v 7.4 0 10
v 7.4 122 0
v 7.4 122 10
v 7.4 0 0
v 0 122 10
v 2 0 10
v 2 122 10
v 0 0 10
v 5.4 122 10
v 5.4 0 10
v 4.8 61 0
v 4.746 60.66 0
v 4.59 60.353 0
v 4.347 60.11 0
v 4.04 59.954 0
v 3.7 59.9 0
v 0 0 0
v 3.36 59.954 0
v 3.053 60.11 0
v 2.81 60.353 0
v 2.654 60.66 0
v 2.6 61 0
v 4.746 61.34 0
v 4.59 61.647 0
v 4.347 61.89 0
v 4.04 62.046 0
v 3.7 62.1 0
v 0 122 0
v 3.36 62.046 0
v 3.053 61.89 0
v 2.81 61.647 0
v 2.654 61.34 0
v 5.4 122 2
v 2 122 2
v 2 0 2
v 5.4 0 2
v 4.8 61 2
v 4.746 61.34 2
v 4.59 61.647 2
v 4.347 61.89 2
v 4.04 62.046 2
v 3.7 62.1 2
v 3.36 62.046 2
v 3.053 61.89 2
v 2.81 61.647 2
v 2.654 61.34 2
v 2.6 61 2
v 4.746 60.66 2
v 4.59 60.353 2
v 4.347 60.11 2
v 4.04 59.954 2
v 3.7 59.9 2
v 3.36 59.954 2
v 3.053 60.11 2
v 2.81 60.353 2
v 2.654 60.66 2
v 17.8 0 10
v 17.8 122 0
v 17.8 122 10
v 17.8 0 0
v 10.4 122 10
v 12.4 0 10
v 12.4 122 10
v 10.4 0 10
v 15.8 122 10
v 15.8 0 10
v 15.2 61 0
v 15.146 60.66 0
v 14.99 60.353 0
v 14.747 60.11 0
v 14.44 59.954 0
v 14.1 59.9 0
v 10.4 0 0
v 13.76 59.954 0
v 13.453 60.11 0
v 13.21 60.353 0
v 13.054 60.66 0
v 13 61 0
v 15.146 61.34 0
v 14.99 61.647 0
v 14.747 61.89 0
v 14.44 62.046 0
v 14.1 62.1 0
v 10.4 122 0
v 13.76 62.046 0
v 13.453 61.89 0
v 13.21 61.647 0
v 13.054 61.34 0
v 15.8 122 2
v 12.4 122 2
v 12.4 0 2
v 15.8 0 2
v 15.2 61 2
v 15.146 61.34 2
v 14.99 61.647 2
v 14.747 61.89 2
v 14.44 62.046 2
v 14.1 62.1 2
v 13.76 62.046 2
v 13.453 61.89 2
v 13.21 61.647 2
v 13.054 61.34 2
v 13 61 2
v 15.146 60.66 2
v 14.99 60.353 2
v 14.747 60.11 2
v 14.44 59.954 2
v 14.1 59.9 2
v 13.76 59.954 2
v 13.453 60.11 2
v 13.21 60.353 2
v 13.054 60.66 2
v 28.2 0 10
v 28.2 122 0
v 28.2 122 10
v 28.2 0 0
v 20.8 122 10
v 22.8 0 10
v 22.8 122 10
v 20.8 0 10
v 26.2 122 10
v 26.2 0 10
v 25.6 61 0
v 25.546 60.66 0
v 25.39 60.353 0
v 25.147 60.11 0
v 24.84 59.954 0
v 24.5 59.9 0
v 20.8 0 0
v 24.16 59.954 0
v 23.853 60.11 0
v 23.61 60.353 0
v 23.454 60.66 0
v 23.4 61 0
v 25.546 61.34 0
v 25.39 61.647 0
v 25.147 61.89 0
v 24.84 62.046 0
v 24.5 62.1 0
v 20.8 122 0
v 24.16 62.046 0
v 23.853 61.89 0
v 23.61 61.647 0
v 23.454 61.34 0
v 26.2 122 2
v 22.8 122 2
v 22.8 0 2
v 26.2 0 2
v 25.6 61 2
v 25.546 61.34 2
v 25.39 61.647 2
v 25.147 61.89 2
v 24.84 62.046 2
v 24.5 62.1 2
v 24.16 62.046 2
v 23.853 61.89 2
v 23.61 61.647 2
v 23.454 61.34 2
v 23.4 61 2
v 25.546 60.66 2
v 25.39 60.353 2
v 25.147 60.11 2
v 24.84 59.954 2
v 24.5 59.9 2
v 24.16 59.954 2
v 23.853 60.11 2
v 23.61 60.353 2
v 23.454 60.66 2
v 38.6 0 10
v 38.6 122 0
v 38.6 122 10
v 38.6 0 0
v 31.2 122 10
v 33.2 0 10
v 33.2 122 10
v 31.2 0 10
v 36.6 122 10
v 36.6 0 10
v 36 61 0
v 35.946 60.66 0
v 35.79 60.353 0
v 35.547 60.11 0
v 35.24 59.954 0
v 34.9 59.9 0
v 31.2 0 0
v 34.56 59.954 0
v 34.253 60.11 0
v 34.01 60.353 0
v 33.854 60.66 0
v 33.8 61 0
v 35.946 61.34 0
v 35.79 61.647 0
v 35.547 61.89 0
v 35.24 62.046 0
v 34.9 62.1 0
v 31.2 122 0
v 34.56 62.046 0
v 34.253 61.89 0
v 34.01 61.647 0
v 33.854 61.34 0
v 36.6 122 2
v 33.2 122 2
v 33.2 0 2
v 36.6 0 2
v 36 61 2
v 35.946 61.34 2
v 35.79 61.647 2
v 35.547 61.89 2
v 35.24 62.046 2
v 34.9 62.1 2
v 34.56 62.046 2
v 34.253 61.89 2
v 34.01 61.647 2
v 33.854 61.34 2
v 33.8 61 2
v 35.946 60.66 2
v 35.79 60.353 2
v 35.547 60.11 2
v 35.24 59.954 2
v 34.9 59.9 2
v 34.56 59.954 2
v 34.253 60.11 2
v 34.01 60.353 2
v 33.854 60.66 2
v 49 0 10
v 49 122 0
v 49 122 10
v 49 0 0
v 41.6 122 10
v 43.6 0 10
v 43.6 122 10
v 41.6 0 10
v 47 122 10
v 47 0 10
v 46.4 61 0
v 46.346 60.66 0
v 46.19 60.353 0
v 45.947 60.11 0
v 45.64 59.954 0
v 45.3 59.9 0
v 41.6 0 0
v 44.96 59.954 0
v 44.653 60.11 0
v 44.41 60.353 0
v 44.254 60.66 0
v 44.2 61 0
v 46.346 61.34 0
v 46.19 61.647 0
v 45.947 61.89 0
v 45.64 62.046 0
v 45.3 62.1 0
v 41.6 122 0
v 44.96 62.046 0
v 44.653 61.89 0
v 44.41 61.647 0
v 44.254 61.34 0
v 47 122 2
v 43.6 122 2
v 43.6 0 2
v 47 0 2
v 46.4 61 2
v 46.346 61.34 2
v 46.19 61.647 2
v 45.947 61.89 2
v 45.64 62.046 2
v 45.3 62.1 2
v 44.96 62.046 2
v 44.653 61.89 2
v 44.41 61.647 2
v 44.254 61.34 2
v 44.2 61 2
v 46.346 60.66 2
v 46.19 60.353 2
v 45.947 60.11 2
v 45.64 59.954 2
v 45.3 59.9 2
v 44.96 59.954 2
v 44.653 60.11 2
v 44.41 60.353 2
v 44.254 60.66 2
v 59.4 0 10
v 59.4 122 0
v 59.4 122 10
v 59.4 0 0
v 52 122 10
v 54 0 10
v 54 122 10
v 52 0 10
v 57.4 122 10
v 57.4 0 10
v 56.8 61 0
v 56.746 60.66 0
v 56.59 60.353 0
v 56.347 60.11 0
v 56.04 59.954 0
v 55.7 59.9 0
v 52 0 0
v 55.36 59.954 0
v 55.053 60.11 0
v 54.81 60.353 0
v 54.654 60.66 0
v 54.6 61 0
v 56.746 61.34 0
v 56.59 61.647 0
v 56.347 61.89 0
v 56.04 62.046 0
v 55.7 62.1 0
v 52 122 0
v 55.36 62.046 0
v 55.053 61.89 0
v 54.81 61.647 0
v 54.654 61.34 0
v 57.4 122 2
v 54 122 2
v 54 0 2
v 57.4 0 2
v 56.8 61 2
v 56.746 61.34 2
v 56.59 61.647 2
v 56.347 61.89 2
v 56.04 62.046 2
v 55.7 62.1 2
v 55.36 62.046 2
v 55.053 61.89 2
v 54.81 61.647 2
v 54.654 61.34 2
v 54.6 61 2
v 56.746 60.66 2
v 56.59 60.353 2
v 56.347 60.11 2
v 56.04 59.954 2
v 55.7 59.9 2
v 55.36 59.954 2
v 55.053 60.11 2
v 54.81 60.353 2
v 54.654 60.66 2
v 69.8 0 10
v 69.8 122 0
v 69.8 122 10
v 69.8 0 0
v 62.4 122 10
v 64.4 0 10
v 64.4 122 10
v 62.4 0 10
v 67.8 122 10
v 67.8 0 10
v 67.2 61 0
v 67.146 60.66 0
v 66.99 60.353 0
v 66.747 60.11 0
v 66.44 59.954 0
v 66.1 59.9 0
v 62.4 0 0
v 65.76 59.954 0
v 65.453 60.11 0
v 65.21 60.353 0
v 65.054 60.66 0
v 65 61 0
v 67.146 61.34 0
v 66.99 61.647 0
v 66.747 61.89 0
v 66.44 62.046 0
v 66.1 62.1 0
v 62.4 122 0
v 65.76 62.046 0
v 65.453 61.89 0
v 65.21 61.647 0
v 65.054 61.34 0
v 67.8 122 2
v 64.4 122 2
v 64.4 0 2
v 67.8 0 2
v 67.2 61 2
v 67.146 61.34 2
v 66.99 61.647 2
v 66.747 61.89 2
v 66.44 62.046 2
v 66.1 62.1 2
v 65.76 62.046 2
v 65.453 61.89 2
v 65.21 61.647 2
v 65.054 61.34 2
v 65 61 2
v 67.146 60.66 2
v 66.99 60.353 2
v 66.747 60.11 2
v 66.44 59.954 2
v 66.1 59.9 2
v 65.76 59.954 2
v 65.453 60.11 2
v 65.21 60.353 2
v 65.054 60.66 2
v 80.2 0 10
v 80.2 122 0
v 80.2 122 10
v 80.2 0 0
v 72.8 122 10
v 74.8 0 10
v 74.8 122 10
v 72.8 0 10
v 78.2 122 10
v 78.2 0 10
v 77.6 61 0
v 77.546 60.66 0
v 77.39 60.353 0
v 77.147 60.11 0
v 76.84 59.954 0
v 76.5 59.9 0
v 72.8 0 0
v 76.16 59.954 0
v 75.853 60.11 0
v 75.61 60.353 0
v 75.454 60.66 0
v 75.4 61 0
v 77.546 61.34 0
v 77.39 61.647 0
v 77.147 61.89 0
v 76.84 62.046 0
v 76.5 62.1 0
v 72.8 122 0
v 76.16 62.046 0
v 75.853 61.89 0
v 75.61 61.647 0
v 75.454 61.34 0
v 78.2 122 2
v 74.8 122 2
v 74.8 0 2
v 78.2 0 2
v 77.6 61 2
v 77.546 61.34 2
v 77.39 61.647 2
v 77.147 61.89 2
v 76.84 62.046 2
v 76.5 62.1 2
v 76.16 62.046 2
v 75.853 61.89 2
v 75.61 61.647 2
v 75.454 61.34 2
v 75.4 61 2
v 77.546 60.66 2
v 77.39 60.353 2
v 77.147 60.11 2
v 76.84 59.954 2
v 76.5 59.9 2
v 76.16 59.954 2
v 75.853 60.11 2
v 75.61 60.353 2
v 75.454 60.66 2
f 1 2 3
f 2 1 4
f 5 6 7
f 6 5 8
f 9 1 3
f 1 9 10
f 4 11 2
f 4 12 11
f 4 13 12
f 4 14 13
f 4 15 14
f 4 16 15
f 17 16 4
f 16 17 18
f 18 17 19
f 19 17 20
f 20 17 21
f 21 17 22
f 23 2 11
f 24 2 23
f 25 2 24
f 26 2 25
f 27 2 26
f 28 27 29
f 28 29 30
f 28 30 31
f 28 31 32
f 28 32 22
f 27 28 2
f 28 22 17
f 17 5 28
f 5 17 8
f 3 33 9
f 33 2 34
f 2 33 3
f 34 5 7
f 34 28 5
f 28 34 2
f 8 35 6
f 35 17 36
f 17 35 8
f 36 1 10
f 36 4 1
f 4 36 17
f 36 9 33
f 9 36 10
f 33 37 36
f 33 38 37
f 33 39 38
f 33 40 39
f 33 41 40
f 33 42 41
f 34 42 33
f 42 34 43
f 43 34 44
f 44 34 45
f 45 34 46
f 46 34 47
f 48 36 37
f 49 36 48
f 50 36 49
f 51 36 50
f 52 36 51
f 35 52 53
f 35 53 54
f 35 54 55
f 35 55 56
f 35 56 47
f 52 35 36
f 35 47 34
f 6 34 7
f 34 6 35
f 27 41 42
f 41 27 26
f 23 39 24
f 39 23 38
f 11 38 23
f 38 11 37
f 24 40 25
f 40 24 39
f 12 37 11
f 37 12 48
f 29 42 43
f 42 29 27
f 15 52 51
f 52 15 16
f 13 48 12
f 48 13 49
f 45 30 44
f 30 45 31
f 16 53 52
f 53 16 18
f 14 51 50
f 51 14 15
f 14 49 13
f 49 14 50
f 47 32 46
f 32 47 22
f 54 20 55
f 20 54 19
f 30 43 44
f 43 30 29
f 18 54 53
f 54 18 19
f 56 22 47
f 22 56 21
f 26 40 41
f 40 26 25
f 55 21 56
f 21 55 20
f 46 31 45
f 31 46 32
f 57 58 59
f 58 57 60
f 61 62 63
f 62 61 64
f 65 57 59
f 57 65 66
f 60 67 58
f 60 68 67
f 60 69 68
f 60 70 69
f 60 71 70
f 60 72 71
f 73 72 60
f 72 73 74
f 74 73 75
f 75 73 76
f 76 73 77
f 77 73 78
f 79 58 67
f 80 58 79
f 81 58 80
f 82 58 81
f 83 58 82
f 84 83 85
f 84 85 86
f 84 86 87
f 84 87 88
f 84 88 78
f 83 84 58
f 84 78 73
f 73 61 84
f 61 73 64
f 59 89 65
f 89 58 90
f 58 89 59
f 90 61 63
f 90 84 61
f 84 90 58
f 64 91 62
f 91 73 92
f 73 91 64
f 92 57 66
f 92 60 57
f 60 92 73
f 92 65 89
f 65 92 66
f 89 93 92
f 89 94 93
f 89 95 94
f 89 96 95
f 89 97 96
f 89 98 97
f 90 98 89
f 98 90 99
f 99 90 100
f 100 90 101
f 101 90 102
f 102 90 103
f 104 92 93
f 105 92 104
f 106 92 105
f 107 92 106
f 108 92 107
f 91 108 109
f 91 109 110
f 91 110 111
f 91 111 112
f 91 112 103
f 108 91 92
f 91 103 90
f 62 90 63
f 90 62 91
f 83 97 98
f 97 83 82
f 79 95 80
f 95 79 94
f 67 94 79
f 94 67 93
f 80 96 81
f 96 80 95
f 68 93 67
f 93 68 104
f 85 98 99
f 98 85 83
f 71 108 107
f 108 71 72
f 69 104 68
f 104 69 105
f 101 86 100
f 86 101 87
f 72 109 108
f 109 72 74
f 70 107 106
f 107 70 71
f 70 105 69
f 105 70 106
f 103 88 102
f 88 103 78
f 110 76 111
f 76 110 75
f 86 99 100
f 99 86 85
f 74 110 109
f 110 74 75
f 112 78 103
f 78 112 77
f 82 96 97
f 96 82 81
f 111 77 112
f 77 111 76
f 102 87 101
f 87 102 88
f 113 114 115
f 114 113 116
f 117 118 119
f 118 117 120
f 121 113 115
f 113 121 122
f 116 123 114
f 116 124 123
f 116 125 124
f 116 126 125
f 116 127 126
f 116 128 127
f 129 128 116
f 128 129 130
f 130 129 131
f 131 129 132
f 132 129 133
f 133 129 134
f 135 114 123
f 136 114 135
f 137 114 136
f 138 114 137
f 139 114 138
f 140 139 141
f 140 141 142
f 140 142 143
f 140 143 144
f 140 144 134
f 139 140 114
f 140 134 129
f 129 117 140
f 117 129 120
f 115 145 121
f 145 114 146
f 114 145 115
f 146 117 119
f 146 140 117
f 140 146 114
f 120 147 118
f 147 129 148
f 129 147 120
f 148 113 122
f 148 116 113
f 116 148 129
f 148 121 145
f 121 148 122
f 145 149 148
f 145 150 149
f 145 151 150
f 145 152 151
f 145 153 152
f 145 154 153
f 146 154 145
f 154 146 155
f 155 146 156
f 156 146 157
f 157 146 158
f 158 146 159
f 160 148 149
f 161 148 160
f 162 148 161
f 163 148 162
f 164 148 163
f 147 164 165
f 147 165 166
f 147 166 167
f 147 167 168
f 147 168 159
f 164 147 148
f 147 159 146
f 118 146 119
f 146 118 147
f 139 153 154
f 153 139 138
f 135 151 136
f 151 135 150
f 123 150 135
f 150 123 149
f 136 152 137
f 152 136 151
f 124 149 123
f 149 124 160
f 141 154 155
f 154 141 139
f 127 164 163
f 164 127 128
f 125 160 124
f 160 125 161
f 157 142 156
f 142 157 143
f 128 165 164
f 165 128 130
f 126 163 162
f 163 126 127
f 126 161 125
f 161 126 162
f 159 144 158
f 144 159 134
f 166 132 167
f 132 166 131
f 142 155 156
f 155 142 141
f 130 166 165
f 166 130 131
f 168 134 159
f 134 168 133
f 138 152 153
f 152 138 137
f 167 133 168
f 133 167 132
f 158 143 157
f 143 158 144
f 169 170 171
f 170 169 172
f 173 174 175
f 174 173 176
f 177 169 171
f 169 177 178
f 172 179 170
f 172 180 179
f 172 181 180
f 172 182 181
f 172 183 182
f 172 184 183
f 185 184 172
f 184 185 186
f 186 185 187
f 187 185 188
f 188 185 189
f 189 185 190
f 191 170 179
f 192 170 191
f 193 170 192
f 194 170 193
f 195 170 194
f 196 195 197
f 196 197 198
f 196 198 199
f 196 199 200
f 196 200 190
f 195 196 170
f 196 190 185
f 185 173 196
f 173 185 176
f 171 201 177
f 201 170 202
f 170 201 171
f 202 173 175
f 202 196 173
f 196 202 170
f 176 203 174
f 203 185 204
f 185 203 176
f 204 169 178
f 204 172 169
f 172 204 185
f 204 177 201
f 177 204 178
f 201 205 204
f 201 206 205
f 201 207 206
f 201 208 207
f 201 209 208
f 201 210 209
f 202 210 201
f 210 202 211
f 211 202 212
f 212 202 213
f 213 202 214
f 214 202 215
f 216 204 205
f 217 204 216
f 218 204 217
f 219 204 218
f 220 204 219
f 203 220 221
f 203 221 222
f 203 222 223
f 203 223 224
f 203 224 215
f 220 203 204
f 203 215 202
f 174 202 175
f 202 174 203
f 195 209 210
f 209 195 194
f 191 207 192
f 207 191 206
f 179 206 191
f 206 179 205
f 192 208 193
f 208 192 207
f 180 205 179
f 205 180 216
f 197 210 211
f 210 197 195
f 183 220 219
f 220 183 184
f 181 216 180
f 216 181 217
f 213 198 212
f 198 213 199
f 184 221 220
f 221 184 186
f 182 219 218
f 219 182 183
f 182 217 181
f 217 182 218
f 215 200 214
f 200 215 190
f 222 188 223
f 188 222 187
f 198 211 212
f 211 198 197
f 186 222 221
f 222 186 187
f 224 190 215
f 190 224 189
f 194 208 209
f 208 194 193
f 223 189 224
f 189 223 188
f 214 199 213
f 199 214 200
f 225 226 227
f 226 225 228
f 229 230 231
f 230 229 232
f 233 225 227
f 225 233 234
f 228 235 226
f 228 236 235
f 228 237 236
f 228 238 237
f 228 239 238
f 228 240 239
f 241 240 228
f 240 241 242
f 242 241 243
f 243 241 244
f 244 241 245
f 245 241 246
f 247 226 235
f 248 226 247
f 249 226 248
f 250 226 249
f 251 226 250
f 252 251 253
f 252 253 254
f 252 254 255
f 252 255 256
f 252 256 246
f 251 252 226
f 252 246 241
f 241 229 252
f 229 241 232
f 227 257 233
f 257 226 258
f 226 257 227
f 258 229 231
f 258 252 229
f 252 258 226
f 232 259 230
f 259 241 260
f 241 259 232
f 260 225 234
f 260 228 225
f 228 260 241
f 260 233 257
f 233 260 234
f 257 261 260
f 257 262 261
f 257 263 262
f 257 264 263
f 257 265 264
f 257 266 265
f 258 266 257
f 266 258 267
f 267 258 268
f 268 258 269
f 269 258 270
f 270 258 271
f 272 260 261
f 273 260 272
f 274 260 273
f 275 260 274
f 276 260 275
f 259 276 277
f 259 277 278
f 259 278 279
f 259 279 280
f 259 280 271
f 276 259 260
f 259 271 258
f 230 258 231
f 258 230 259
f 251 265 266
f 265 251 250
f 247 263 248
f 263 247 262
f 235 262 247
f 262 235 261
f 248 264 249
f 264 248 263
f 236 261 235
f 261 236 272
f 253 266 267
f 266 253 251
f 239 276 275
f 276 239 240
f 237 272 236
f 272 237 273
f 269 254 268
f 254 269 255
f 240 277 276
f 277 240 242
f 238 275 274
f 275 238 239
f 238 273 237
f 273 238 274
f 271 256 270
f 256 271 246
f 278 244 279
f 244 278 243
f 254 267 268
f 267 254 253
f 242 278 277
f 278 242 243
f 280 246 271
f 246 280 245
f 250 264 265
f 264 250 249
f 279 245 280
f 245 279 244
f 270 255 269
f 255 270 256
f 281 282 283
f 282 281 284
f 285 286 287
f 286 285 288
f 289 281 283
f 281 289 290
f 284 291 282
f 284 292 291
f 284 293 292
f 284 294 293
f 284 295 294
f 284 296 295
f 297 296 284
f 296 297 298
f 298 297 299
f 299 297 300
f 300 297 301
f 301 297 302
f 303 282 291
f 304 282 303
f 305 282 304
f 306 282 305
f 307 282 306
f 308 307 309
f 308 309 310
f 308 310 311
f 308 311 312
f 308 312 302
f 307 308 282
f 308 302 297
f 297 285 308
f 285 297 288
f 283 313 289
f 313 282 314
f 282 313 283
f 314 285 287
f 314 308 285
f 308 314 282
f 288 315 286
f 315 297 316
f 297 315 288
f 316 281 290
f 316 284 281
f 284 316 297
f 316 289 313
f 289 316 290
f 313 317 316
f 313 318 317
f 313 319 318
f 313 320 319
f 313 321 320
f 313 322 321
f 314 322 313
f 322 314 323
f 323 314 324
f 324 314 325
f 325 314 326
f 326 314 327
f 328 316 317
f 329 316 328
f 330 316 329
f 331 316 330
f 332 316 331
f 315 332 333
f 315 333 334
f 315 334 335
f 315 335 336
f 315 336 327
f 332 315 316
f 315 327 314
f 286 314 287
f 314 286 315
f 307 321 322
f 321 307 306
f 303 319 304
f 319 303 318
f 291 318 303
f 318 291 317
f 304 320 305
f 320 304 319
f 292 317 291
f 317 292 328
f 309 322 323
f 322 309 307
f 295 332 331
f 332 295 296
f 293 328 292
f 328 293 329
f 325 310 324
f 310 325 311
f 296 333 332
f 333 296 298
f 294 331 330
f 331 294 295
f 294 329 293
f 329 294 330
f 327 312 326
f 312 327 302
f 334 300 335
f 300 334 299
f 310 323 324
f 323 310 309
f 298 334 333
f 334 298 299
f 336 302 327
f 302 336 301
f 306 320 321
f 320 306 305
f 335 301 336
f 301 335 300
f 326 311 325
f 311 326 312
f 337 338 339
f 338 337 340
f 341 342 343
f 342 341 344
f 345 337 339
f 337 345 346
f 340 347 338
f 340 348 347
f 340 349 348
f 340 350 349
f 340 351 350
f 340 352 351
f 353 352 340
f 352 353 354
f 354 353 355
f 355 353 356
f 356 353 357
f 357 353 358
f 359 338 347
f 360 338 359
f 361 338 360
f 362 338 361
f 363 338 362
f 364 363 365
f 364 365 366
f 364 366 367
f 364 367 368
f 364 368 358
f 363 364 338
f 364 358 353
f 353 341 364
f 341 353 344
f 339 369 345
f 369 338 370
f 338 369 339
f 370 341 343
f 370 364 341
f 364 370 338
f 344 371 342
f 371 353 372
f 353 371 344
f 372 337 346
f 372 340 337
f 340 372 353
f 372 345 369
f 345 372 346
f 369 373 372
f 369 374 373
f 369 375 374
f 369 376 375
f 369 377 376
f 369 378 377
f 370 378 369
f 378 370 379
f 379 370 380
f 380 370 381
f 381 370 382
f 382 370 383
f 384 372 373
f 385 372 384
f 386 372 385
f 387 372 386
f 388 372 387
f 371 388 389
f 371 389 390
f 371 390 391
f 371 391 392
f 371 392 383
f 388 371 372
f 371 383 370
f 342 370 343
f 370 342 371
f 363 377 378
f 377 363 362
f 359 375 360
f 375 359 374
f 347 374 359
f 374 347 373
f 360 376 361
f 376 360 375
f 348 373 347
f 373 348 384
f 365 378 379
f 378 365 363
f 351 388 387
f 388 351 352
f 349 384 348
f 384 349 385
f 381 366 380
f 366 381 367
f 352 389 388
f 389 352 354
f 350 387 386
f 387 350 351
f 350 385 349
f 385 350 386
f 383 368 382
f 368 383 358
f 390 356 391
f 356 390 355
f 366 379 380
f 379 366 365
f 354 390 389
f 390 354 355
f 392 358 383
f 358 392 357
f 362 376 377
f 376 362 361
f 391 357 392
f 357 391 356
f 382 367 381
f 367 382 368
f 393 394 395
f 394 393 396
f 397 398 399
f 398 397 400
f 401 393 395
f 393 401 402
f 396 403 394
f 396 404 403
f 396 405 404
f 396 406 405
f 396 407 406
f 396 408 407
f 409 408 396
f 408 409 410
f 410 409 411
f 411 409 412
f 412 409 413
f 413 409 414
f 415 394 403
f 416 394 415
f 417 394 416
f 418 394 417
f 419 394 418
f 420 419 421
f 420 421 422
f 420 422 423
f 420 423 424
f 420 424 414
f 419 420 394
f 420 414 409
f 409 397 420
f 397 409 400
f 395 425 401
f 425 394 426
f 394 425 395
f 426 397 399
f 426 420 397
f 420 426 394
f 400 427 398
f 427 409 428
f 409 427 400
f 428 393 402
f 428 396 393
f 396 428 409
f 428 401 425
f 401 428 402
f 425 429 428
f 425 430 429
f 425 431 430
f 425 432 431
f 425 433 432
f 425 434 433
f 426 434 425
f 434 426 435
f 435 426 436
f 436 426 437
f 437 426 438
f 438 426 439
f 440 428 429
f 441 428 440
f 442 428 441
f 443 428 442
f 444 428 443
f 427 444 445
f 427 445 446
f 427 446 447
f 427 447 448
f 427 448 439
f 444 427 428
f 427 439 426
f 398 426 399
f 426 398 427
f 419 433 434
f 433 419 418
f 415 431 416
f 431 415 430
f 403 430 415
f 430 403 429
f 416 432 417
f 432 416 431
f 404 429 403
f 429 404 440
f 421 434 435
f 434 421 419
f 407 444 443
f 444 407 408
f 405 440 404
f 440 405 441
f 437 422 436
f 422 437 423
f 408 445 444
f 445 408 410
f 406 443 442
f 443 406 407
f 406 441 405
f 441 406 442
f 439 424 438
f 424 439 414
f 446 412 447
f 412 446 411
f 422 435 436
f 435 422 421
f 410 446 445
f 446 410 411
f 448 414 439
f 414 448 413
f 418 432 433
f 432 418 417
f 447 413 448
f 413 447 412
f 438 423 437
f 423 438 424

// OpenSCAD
// ============================================================
// PRINT: TRILHOS TELA CARVÃO (Posições 5 e 6)
// 8 peças idênticas — canal 3.4mm (MDF 3mm + 0.4mm folga)
// Mesa: 83mm × 122mm — cabe na Ender 3 (200×200mm) ✓
// Tempo estimado: ~50min
// ============================================================
// 2 filtros × 2 laterais × 2 metades = 8 peças
// Todas idênticas (junta reta, sem dovetail)
// ============================================================

use <TRILHO_FILTRO.scad>

gap = 3;
canal = 3.4;
largura = canal + 2*2; // 7.4mm

// 8 peças lado a lado em X
for (i = [0:7]) {
    translate([i * (largura + gap), 0, 0])
        trilho_metade_a(canal);
}

// Guia visual da mesa (não imprime)
%translate([0, 0, -0.5])
    cube([200, 200, 0.1]);
